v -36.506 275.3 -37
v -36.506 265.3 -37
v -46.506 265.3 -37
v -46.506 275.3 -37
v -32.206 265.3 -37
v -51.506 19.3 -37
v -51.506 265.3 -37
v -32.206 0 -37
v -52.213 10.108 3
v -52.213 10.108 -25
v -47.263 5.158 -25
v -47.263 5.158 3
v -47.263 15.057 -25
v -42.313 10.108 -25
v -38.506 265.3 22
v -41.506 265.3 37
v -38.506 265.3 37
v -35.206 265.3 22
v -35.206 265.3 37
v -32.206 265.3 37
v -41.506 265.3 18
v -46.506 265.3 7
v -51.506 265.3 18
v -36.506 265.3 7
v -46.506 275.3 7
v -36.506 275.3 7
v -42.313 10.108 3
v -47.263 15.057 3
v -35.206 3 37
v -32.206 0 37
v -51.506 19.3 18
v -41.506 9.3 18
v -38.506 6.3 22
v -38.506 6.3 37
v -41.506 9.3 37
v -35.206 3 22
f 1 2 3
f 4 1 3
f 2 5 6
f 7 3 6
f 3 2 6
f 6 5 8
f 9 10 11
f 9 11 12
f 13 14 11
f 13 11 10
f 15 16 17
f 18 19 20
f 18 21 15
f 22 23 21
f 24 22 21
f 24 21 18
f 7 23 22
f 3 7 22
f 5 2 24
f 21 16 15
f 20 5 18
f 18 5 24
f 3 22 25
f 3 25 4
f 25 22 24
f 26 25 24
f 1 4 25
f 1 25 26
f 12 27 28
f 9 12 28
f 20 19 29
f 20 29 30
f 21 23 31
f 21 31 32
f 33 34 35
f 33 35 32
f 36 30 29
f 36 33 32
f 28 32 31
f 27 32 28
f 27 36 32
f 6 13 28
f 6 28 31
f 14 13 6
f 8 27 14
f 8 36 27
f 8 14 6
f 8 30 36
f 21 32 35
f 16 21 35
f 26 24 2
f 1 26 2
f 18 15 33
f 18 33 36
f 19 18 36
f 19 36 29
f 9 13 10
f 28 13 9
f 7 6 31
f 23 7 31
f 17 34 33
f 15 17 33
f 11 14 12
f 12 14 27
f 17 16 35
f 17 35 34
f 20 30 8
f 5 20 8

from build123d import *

# Parameters (mm, degrees)
BOSS_EXTRUDE1_DEPTH = 265.3
SKETCH2_W           = 10
SKETCH2_H           = 44
BOSS_EXTRUDE2_DEPTH = 10
SKETCH3_W           = 381.110289958
SKETCH3_H           = 88.245673433
CUT_EXTRUDE1_DEPTH  = 27
SKETCH4_W           = 28
SKETCH4_H           = 7
BOSS_EXTRUDE3_DEPTH = 7


with BuildPart() as part:
    # Sketch1 → Boss-Extrude1 (new body)
    with BuildSketch(Plane(origin=(0, 0, 0), x_dir=(1, 0, 0), z_dir=(0, 1, 0))):
        Polygon((-51.505795374, 37), (-51.505795374, -18), (-41.505795374, -18), (-41.505795374, -37), (-38.505795374, -37), (-38.505795374, -22), (-35.205795374, -22), (-35.205795374, -37), (-32.205795374, -37), (-32.205795374, 37), align=None)
    extrude(amount=BOSS_EXTRUDE1_DEPTH)

    # Sketch2 → Boss-Extrude2 (add)
    with BuildSketch(Plane(origin=(0, 265.3, 0), x_dir=(1, 0, 0), z_dir=(0, 1, 0))):
        with Locations((-41.505795374, 15)):
            Rectangle(SKETCH2_W, SKETCH2_H)
    extrude(amount=BOSS_EXTRUDE2_DEPTH)

    # Sketch3 → Cut-Extrude1 (cut)
    with BuildSketch(Plane(origin=(-16.102897687, -16.102897687, 0), x_dir=(0, 0, -1), z_dir=(-0.7071067811865488, -0.7071067811865464, 0))):
        with Locations((41.438548882, -32.158306753)):
            Rectangle(SKETCH3_W, SKETCH3_H)
    extrude(amount=CUT_EXTRUDE1_DEPTH, mode=Mode.SUBTRACT)

    # Sketch4 → Boss-Extrude3 (add)
    with BuildSketch(Plane(origin=(-16.102897687, -16.102897687, 0), x_dir=(0, 0, 1), z_dir=(-0.7071067811865487, -0.7071067811865465, 0))):
        with Locations((-11, 40.567258056)):
            Rectangle(SKETCH4_W, SKETCH4_H)
    extrude(amount=BOSS_EXTRUDE3_DEPTH)


solid = part.part
